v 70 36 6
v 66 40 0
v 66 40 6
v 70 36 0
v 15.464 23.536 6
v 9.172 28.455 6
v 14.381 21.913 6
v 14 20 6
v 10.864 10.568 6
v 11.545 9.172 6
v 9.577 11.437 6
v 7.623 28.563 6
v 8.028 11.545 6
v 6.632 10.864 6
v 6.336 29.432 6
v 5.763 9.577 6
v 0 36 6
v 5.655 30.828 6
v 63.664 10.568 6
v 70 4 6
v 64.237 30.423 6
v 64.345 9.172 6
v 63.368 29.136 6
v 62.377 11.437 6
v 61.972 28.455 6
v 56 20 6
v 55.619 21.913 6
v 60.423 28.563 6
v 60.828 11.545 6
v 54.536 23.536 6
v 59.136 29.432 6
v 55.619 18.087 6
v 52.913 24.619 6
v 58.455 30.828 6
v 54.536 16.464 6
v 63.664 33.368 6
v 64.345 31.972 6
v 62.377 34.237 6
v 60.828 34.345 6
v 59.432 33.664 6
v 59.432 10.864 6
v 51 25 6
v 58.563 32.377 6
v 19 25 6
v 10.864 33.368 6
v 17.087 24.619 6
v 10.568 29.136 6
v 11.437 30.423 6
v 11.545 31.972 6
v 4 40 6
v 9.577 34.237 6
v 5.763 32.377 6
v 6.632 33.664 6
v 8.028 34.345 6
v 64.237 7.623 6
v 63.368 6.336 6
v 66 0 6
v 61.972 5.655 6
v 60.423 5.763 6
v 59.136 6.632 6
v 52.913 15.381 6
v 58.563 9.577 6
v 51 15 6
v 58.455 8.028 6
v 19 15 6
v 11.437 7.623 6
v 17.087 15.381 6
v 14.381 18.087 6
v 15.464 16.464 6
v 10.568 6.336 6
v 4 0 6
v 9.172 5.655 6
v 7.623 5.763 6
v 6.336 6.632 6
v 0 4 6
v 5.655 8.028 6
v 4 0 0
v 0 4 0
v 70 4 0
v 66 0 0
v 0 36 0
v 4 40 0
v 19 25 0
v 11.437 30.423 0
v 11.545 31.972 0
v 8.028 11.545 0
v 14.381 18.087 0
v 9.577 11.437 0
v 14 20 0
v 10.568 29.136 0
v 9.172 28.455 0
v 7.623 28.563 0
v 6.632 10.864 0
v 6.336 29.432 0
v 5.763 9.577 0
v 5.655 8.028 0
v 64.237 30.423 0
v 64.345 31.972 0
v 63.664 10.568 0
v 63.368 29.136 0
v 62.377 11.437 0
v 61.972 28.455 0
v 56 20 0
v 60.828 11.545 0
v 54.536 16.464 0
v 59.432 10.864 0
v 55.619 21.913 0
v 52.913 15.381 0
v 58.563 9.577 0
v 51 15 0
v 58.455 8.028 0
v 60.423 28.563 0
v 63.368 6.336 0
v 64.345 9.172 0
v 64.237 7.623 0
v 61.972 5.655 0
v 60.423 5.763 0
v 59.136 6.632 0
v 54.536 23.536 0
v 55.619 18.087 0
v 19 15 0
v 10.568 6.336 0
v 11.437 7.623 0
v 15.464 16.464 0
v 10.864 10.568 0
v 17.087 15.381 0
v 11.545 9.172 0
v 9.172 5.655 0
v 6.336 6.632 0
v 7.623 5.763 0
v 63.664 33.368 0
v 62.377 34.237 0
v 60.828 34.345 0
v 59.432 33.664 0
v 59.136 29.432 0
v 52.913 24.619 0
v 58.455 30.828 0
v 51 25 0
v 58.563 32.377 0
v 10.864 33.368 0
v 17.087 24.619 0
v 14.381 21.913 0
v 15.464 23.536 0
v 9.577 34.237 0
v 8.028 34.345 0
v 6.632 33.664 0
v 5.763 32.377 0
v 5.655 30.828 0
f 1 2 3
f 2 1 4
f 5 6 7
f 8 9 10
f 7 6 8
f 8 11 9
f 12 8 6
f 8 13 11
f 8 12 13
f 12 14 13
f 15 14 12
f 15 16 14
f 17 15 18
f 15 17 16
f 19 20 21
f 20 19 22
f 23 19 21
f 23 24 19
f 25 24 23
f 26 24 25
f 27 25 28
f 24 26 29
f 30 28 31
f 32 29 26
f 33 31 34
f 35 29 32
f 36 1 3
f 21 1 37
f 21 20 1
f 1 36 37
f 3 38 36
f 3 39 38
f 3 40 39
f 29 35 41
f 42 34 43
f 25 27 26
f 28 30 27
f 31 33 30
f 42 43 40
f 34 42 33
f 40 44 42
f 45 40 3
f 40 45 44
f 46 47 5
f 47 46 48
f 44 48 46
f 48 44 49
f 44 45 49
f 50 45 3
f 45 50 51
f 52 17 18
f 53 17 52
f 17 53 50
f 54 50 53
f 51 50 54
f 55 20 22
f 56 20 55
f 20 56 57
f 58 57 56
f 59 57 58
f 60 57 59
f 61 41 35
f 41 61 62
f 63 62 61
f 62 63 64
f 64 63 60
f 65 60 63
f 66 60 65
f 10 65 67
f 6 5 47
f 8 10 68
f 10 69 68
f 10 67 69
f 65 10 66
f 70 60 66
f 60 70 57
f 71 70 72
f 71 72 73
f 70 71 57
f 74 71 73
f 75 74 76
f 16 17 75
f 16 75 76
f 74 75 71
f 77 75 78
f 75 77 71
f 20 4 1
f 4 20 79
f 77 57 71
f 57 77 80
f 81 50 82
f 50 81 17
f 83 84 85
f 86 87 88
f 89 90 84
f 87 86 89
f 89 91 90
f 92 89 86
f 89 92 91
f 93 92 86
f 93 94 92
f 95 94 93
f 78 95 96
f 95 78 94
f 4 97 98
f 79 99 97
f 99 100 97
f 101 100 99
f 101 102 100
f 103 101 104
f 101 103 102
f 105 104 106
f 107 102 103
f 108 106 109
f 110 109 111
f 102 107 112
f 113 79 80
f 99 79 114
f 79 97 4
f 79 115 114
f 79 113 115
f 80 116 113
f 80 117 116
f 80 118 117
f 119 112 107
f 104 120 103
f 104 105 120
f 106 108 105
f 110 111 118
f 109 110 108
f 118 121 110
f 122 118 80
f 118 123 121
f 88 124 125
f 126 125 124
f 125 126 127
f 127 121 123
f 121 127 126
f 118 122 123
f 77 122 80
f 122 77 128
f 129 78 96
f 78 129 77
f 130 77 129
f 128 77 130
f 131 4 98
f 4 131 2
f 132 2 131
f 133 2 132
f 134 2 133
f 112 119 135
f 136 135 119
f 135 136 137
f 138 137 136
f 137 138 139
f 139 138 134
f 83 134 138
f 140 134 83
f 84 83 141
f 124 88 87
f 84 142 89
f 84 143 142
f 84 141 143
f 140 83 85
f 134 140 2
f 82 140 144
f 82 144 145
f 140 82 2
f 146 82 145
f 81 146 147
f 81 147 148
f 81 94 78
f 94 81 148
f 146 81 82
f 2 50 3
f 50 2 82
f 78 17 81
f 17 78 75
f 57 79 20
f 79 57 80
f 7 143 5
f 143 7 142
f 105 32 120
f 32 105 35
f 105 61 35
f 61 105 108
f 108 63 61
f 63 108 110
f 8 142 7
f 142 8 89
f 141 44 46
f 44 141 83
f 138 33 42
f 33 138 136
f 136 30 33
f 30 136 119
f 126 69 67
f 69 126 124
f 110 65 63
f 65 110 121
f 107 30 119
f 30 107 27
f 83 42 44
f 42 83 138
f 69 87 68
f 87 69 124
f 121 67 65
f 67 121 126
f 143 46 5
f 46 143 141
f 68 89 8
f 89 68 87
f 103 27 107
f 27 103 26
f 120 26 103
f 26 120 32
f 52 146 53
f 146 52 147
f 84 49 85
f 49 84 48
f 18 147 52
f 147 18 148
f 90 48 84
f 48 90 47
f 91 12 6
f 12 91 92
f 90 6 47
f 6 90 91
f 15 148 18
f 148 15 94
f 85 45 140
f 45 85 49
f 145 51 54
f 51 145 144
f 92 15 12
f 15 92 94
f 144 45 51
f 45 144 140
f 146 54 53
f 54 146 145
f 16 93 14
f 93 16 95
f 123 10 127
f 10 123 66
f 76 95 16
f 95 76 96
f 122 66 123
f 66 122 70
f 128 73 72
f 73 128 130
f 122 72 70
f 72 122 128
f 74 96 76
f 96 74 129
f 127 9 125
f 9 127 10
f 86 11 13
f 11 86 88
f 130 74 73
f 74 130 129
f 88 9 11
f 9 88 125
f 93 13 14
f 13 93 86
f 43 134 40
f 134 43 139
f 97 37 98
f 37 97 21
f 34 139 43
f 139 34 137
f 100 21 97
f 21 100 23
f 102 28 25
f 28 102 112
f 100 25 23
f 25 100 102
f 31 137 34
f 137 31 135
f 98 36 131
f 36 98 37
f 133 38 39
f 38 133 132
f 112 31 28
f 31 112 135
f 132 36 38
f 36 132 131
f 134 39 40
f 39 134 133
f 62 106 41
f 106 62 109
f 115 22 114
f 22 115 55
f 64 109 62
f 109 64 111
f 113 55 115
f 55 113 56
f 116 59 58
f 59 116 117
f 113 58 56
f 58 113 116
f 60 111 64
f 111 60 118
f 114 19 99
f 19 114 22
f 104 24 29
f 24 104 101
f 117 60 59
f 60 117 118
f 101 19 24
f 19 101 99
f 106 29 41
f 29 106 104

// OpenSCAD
$fn = 32;

// ----------------------------------------------------------------------
// Bracket plate: slot plate 70 x 40
// ----------------------------------------------------------------------

// --- parameters (mm) ---
hole_r = 3;               // bolt hole radius
plate_t = 6;              // plate thickness, Z (extrusion height)
plate_l = 70;             // plate length
plate_w = 40;             // plate width
slot_l = 32;              // slot straight length
slot_r = 5;               // slot end radius

slot_len = slot_l + 2 * slot_r;
slot_w = 2 * slot_r;
hole_d2 = 2 * hole_r;

profile = [[4, 0], [66, 0], [70, 4], [70, 36], [66, 40], [4, 40], [0, 36], [0, 4]];  // primary outline, 8 points, counter clockwise
void_1 = [[51, 15], [52.913, 15.381], [54.536, 16.464], [55.619, 18.087], [56, 20], [55.619, 21.913], [54.536, 23.536], [52.913, 24.619], [51, 25], [19, 25], [17.087, 24.619], [15.464, 23.536], [14.381, 21.913], [14, 20], [14.381, 18.087], [15.464, 16.464], [17.087, 15.381], [19, 15]];  // grip slot, 18 points
void_2 = [[11.545, 31.972], [10.864, 33.368], [9.577, 34.237], [8.028, 34.345], [6.632, 33.664], [5.763, 32.377], [5.655, 30.828], [6.336, 29.432], [7.623, 28.563], [9.172, 28.455], [10.568, 29.136], [11.437, 30.423]];  // corner hole, 12 points
void_3 = [[11.545, 9.172], [10.864, 10.568], [9.577, 11.437], [8.028, 11.545], [6.632, 10.864], [5.763, 9.577], [5.655, 8.028], [6.336, 6.632], [7.623, 5.763], [9.172, 5.655], [10.568, 6.336], [11.437, 7.623]];  // corner hole, 12 points
void_4 = [[64.345, 31.972], [63.664, 33.368], [62.377, 34.237], [60.828, 34.345], [59.432, 33.664], [58.563, 32.377], [58.455, 30.828], [59.136, 29.432], [60.423, 28.563], [61.972, 28.455], [63.368, 29.136], [64.237, 30.423]];  // corner hole, 12 points
void_5 = [[64.345, 9.172], [63.664, 10.568], [62.377, 11.437], [60.828, 11.545], [59.432, 10.864], [58.563, 9.577], [58.455, 8.028], [59.136, 6.632], [60.423, 5.763], [61.972, 5.655], [63.368, 6.336], [64.237, 7.623]];  // corner hole, 12 points

// --- the one profile operation ---
difference() {
  linear_extrude(height = plate_t) polygon(points = profile);
  translate([0, 0, -1])
    linear_extrude(height = plate_t + 2) polygon(points = void_1);
  translate([0, 0, -1])
    linear_extrude(height = plate_t + 2) polygon(points = void_2);
  translate([0, 0, -1])
    linear_extrude(height = plate_t + 2) polygon(points = void_3);
  translate([0, 0, -1])
    linear_extrude(height = plate_t + 2) polygon(points = void_4);
  translate([0, 0, -1])
    linear_extrude(height = plate_t + 2) polygon(points = void_5);
}
